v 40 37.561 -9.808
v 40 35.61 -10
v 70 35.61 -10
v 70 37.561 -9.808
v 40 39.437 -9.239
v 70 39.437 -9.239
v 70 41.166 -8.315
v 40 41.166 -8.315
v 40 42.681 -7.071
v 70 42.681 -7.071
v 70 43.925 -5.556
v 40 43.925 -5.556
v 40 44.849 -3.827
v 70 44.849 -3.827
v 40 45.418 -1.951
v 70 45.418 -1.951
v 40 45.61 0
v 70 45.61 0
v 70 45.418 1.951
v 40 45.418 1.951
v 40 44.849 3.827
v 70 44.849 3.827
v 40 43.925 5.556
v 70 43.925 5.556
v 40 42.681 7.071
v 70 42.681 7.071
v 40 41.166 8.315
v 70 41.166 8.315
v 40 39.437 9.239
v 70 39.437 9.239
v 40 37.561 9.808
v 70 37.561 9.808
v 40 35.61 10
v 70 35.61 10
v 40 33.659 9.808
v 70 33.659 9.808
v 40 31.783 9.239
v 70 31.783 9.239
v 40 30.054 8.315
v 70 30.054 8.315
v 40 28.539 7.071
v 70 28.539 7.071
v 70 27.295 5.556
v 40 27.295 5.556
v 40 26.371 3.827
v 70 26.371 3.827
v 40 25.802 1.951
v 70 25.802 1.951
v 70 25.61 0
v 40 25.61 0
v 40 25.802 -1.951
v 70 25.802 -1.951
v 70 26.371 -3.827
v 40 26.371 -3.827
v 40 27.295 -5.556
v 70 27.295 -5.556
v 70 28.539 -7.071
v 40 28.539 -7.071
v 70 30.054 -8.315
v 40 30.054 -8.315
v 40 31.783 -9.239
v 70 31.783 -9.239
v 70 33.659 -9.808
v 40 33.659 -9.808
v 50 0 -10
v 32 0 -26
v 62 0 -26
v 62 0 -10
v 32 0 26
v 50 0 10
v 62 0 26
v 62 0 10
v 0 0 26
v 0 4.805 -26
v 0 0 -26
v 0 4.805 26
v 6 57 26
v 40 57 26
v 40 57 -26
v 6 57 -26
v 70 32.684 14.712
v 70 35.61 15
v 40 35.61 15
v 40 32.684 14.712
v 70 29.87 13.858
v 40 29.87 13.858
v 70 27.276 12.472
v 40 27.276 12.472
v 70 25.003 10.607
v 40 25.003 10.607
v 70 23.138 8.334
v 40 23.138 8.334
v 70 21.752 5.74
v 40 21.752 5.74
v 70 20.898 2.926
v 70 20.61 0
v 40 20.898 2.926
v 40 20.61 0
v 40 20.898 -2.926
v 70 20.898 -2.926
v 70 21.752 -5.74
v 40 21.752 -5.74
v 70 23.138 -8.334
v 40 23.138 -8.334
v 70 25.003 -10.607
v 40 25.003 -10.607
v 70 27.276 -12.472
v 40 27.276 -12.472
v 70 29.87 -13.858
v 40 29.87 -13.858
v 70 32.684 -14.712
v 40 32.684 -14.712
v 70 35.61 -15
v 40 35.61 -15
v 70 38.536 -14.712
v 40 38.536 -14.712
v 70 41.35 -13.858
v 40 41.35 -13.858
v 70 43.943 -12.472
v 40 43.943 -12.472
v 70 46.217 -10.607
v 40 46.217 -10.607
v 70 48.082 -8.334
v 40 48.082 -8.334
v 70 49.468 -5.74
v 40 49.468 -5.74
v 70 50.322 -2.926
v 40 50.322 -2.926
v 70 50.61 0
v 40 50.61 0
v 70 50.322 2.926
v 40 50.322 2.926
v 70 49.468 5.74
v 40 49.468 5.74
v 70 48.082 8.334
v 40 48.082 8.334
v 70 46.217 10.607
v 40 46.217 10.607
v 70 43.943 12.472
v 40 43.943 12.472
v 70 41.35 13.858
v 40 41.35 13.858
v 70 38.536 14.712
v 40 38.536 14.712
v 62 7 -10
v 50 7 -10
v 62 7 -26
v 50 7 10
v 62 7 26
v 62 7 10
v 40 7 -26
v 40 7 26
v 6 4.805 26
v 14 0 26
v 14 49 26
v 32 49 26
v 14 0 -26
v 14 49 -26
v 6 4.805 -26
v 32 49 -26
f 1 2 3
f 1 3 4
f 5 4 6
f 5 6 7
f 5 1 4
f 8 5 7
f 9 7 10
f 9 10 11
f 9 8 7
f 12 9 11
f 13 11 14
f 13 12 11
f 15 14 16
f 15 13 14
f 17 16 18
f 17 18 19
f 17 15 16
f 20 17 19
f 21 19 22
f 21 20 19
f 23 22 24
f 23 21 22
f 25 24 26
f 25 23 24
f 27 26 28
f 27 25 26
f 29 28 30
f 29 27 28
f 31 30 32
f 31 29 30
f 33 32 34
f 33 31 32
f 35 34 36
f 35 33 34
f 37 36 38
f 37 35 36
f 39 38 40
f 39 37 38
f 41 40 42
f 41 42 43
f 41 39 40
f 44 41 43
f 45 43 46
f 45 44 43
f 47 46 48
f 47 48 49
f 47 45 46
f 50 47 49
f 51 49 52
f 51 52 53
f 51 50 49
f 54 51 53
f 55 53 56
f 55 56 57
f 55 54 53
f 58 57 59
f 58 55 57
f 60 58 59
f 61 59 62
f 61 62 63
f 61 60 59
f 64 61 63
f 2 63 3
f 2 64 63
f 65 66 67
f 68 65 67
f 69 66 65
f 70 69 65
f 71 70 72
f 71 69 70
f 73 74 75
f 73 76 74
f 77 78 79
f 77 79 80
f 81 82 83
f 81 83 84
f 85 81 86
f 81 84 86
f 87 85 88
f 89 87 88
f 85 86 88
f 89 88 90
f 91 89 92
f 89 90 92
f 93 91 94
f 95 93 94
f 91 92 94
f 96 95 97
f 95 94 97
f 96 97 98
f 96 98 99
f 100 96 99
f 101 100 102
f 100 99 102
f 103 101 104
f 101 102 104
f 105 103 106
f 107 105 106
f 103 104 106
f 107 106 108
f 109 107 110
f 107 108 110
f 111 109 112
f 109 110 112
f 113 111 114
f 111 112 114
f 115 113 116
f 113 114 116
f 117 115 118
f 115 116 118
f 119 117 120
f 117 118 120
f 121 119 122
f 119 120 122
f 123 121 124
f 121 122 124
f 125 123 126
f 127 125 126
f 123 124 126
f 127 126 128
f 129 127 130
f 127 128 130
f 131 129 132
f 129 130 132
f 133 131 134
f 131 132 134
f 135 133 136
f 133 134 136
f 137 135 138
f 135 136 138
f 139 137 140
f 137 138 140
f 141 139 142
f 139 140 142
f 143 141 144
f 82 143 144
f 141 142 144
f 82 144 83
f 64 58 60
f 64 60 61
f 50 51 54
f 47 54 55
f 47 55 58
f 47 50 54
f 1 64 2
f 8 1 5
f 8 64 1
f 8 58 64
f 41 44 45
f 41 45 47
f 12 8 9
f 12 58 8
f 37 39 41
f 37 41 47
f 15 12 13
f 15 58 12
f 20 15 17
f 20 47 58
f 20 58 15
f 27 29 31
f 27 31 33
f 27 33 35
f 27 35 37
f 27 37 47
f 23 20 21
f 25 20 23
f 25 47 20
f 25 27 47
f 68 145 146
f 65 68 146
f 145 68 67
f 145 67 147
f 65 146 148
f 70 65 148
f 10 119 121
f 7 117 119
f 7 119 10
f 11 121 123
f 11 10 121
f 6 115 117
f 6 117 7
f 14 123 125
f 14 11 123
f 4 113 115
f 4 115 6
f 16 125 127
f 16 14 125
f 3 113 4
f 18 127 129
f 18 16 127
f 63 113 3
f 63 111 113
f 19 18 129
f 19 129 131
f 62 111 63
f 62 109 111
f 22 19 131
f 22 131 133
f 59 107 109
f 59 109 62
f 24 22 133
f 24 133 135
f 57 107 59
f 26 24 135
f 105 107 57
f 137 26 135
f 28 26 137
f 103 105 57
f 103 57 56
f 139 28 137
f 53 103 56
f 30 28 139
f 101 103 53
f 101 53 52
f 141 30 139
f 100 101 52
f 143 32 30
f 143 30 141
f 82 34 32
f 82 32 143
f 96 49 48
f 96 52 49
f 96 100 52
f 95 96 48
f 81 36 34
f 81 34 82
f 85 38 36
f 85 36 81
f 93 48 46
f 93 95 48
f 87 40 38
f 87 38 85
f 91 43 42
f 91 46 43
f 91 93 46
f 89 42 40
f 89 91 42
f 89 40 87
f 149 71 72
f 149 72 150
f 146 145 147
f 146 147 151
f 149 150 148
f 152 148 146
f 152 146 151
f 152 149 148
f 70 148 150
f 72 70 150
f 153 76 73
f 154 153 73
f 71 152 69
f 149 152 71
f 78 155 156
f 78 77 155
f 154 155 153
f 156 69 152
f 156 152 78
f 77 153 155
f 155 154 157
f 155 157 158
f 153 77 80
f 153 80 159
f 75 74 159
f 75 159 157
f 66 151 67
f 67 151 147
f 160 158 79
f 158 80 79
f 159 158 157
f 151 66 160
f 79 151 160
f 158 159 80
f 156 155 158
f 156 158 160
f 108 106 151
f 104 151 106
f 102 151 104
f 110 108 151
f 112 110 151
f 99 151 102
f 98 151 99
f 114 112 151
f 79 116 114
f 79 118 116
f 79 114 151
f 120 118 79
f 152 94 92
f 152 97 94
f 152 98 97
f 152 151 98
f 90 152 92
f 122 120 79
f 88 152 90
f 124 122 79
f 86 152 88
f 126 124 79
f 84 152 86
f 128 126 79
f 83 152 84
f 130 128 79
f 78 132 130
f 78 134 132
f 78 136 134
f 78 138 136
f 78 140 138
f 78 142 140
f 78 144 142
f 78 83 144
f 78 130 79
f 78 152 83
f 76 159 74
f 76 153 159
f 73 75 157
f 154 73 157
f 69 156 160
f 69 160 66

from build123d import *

# Parameters (mm, degrees)
SALIENTE_EXTRUIR2_DEPTH = 26
CORTAR_EXTRUIR1_DEPTH   = 84.785440263
CROQUIS4_R              = 15
CROQUIS4_R_2            = 10
SALIENTE_EXTRUIR3_DEPTH = 30


with BuildPart() as part:
    # Croquis1 → Saliente-Extruir2 (new, symmetric)
    with BuildSketch(Plane.XY):
        Polygon((0, 0), (14, 0), (14, 49), (32, 49), (32, 0), (62, 0), (62, 7), (40, 7), (40, 57), (6, 57), (6, 4.804511278), (0, 4.804511278), align=None)
    extrude(amount=SALIENTE_EXTRUIR2_DEPTH, both=True)

    # Croquis3 → Cortar-Extruir1 (cut, through all)
    with BuildSketch(Plane(origin=(0, 7, 0), x_dir=(1, 0, 0), z_dir=(0, 1, 0))):
        Polygon((62, 0), (62, 10), (50, 10), (50, -10), (62, -10), align=None)
    extrude(amount=-CORTAR_EXTRUIR1_DEPTH, mode=Mode.SUBTRACT)

    # Croquis4 → Saliente-Extruir3 (add)
    with BuildSketch(Plane(origin=(40, 0, 0), x_dir=(0, 0, -1), z_dir=(1, 0, 0))):
        with Locations(Location((0, 35.609925513, 0), (0, 0, 180))):
            Circle(CROQUIS4_R)
        with Locations((0, 35.609925513)):
            Circle(CROQUIS4_R_2, mode=Mode.SUBTRACT)
    extrude(amount=SALIENTE_EXTRUIR3_DEPTH)


solid = part.part
